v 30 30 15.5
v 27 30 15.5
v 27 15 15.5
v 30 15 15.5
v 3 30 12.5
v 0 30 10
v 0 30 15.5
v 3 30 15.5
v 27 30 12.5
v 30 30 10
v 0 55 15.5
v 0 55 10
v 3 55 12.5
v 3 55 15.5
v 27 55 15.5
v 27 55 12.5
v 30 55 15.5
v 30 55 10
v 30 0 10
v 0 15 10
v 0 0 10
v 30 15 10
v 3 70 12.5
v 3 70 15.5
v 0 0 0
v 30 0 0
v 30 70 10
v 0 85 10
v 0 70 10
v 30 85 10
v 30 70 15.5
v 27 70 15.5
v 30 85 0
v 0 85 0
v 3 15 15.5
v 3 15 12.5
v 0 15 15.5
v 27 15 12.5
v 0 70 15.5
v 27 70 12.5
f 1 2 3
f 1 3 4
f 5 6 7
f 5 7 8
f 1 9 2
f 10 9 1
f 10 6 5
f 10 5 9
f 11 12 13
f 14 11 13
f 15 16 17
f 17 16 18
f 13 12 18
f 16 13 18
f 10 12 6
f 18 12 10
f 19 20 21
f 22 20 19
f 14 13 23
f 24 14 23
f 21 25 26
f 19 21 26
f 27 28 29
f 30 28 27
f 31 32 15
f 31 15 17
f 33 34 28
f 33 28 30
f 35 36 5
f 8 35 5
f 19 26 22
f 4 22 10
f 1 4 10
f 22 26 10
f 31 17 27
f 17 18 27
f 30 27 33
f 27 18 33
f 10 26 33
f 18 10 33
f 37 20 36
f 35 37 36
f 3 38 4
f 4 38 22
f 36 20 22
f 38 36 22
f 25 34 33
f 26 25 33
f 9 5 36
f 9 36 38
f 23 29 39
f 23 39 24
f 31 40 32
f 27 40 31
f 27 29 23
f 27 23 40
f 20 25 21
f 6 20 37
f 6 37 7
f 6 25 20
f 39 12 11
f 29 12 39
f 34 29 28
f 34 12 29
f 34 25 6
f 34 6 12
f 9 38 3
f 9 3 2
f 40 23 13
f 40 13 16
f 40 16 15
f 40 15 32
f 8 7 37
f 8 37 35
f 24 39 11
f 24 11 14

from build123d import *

# Parameters (mm, degrees)
SKETCH1_W           = 30
SKETCH1_H           = 85
BOSS_EXTRUDE1_DEPTH = 10
SKETCH2_W           = 30
SKETCH2_H           = 15
BOSS_EXTRUDE2_DEPTH = 2.5
SKETCH3_W           = 3
SKETCH3_H           = 15
BOSS_EXTRUDE3_DEPTH = 3


with BuildPart() as part:
    # Sketch1 → Boss-Extrude1 (new body)
    with BuildSketch(Plane.XY):
        with Locations((15, 42.5)):
            Rectangle(SKETCH1_W, SKETCH1_H)
    extrude(amount=BOSS_EXTRUDE1_DEPTH)

    # Sketch2 → Boss-Extrude2 (add)
    with BuildSketch(Plane.XY.offset(10)):
        with Locations((15, 62.5)):
            Rectangle(SKETCH2_W, SKETCH2_H)
        with Locations((15, 22.5)):
            Rectangle(SKETCH2_W, SKETCH2_H)
    extrude(amount=BOSS_EXTRUDE2_DEPTH)

    # Sketch3 → Boss-Extrude3 (add)
    with BuildSketch(Plane.XY.offset(12.5)):
        with Locations((28.5, 62.5)):
            Rectangle(SKETCH3_W, SKETCH3_H)
        with Locations((28.5, 22.5)):
            Rectangle(SKETCH3_W, SKETCH3_H)
        with Locations((1.5, 22.5)):
            Rectangle(SKETCH3_W, SKETCH3_H)
        with Locations((1.5, 62.5)):
            Rectangle(SKETCH3_W, SKETCH3_H)
    extrude(amount=BOSS_EXTRUDE3_DEPTH)


solid = part.part
